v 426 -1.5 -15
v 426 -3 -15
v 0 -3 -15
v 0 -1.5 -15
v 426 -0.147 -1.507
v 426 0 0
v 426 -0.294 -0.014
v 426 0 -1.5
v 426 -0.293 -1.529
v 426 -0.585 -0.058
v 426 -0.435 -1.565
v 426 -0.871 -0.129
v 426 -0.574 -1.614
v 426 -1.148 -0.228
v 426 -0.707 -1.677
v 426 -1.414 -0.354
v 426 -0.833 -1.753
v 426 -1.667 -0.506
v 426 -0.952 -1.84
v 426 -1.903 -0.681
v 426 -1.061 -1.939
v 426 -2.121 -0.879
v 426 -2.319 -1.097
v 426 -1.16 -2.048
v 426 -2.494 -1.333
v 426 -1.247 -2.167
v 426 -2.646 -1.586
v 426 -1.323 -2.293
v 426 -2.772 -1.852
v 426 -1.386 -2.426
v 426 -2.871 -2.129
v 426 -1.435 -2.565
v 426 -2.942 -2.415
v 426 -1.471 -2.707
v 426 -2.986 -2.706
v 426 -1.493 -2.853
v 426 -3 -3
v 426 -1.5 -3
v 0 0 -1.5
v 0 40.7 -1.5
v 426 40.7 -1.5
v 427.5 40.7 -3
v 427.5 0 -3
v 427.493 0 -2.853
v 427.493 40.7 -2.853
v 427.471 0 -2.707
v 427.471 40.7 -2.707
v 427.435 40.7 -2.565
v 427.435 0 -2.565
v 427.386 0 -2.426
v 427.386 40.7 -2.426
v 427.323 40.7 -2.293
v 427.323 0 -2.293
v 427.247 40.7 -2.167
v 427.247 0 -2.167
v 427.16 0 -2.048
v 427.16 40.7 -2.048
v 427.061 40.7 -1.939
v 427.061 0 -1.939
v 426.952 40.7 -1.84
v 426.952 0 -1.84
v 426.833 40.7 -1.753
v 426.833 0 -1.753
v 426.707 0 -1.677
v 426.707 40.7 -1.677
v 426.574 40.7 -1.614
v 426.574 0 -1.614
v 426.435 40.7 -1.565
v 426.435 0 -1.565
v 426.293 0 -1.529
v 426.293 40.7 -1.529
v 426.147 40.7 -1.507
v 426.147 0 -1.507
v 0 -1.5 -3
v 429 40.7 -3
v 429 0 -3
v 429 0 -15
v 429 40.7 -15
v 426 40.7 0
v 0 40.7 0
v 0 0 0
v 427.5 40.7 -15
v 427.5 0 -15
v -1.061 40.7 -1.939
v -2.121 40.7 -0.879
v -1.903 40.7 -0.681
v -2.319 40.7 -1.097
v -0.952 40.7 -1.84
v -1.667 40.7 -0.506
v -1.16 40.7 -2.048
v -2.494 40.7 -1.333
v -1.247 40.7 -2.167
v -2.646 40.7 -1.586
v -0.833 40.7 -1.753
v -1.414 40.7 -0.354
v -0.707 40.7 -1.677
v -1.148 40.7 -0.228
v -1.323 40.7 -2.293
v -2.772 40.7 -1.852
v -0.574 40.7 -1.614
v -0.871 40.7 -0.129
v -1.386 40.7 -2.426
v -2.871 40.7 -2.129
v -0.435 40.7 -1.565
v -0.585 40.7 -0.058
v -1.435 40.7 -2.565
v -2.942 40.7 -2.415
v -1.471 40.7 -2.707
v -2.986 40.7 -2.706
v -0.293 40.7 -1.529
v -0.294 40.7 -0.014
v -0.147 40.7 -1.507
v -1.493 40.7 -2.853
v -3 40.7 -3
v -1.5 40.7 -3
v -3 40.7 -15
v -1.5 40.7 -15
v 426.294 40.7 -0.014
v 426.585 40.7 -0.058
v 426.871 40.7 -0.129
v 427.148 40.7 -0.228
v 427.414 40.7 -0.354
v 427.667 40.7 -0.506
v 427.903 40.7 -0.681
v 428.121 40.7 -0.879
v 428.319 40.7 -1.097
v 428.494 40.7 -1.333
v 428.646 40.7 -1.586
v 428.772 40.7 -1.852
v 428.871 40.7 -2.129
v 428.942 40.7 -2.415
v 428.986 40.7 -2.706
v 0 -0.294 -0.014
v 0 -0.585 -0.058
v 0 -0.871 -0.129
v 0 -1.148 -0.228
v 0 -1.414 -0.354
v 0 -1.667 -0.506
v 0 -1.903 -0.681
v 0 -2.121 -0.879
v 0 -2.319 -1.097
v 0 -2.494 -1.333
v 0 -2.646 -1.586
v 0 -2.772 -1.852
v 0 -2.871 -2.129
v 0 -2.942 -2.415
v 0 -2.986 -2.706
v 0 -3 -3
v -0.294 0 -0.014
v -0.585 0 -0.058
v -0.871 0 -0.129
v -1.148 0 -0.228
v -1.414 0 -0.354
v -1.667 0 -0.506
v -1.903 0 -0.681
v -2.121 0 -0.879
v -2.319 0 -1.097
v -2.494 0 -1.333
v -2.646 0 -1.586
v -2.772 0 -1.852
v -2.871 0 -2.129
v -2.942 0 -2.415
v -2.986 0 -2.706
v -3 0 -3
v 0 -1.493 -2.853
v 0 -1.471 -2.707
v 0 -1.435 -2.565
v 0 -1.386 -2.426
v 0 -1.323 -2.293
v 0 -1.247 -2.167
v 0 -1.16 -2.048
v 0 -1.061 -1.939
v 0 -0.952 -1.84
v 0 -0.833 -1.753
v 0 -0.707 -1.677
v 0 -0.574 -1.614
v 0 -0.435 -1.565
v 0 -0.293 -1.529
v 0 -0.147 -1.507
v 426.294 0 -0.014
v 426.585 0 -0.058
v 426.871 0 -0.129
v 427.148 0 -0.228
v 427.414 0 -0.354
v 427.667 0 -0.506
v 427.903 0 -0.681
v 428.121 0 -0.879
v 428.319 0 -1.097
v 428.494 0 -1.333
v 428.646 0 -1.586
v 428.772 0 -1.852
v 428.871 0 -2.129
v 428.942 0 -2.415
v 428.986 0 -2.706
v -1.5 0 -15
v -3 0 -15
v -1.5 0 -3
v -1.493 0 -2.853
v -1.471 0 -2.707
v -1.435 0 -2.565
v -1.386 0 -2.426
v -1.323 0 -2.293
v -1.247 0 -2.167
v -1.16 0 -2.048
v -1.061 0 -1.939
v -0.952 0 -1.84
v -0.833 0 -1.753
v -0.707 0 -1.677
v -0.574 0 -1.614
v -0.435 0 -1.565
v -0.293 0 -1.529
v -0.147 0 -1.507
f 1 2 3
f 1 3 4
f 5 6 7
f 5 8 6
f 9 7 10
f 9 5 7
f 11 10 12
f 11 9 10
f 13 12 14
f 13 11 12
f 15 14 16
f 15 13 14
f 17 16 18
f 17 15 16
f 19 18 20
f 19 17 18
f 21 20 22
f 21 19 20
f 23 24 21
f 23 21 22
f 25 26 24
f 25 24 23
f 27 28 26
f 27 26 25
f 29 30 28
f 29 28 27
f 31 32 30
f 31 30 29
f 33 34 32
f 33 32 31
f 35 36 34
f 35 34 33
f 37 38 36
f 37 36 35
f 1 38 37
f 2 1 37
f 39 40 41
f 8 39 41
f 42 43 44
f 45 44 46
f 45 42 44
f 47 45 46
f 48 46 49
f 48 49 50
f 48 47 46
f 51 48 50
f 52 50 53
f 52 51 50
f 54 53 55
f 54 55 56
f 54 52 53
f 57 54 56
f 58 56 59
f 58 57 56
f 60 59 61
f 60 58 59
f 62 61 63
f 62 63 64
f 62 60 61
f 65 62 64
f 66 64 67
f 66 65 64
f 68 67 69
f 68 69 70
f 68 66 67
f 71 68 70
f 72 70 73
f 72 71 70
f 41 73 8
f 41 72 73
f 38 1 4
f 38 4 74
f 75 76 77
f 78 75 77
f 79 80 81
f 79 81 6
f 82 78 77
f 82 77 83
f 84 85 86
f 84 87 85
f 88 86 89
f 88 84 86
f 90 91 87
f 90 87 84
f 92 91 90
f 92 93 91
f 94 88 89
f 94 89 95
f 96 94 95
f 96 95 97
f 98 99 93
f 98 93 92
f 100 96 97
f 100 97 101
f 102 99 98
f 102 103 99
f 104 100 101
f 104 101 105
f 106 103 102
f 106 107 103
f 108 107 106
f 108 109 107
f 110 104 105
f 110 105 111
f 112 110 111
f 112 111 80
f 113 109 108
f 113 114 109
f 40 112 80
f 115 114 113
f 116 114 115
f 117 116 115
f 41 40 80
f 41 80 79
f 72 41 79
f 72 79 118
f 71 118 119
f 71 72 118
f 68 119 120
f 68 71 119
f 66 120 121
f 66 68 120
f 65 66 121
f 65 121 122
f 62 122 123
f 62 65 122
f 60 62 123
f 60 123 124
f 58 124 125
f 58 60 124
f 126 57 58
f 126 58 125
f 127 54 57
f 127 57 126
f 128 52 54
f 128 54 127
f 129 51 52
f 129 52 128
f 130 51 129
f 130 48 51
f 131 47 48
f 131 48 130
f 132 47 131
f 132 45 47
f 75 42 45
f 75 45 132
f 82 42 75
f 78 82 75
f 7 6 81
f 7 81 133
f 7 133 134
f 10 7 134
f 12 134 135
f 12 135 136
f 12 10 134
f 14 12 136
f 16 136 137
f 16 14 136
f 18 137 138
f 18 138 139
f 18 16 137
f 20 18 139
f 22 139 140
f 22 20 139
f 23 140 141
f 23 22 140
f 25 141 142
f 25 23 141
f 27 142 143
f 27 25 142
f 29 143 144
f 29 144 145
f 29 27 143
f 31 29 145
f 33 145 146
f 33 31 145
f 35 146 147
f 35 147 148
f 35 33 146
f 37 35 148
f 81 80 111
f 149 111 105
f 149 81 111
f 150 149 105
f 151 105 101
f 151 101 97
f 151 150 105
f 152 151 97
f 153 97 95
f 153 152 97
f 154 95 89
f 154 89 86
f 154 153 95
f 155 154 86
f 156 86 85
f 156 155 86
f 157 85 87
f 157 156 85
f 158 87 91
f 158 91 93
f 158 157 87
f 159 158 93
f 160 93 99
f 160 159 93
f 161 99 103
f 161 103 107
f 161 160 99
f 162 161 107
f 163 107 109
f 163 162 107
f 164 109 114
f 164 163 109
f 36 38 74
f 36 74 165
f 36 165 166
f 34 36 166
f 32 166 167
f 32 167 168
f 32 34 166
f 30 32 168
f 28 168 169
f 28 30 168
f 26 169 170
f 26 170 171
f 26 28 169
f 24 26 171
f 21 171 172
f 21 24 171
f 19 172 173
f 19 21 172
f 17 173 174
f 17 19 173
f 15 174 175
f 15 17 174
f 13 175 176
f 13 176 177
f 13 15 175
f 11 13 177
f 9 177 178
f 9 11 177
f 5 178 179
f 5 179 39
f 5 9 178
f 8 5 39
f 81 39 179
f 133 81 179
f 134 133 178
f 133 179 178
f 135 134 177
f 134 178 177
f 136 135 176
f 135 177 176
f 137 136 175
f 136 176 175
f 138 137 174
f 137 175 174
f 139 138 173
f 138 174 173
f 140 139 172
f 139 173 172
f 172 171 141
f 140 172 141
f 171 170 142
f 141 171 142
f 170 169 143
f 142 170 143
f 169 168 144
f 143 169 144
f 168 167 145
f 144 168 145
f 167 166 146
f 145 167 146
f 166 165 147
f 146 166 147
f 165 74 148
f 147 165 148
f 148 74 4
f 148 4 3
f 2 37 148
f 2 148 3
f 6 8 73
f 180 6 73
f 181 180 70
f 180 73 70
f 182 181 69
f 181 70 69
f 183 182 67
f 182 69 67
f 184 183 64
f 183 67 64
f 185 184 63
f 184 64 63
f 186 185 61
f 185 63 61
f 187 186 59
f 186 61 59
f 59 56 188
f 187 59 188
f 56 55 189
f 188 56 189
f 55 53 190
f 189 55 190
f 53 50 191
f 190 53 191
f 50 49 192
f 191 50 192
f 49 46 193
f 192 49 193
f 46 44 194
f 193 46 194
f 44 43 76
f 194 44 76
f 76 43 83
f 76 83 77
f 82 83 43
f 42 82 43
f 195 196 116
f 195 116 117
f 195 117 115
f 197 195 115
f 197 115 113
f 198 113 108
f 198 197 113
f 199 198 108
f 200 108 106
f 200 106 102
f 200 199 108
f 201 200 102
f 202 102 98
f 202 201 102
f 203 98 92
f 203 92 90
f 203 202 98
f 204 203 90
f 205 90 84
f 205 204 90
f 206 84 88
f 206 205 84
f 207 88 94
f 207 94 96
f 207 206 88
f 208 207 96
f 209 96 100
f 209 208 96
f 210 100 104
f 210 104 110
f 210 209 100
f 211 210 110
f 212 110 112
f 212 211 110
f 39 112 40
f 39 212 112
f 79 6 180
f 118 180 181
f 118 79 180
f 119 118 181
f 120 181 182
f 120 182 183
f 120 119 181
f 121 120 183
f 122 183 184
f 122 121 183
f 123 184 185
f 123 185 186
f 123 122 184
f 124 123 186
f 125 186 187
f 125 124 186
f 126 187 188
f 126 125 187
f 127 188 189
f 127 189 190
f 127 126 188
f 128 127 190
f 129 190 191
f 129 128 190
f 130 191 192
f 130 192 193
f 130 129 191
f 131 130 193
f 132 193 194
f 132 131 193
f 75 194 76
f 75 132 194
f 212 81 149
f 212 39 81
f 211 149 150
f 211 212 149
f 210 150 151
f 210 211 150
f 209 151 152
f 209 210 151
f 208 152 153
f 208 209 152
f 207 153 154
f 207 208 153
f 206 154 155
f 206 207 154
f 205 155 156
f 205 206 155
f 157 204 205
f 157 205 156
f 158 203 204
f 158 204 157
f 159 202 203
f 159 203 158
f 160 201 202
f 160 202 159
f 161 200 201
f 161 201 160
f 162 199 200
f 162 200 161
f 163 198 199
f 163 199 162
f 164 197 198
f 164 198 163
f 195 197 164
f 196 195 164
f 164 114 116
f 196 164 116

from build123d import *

# Parameters (mm, degrees)
SKETCH_1_W             = 426
SKETCH_1_H             = 40.7
SM_BASE_FLANGE_1_DEPTH = 1.5
SM_EDGE_FLANGE_2_DEPTH = 40.7
SM_EDGE_FLANGE_3_DEPTH = 426
SM_EDGE_FLANGE_4_DEPTH = 40.7


# Sheet-metal steps are written as plain solids
with BuildPart() as part:
    # Sketch 1 → Базовая кромка1 (new body)
    with BuildSketch(Plane.XY):
        with Locations((213, 20.35)):
            Rectangle(SKETCH_1_W, SKETCH_1_H)
    extrude(amount=-SM_BASE_FLANGE_1_DEPTH)

    # Ребро-кромка2 section (across the edge) → Ребро-кромка2 (add)
    with BuildSketch(Plane(origin=(-1.5, 0, -1.5), x_dir=(1, 0, 0), z_dir=(0, 1, 0))):
        with BuildLine():
            Line((-1.5, 1.5), (-1.5, 13.5))
            Line((-1.5, 13.5), (0, 13.5))
            Line((0, 13.5), (0, 1.5))
            ThreePointArc((0, 1.5), (0.439339828, 0.439339828), (1.5, 0))
            Line((1.5, 0), (1.5, -1.5))
            ThreePointArc((1.5, -1.5), (-0.621320344, -0.621320344), (-1.5, 1.5))
        make_face()
    extrude(amount=SM_EDGE_FLANGE_2_DEPTH)

    # Ребро-кромка3 section (across the edge) → Ребро-кромка3 (add)
    with BuildSketch(Plane(origin=(426, -1.5, -1.5), x_dir=(0, 1, 0), z_dir=(-1, 0, 0))):
        with BuildLine():
            Line((-1.5, 1.5), (-1.5, 13.5))
            Line((-1.5, 13.5), (0, 13.5))
            Line((0, 13.5), (0, 1.5))
            ThreePointArc((0, 1.5), (0.439339828, 0.439339828), (1.5, 0))
            Line((1.5, 0), (1.5, -1.5))
            ThreePointArc((1.5, -1.5), (-0.621320344, -0.621320344), (-1.5, 1.5))
        make_face()
    extrude(amount=SM_EDGE_FLANGE_3_DEPTH)

    # Ребро-кромка4 section (across the edge) → Ребро-кромка4 (add)
    with BuildSketch(Plane(origin=(427.5, 40.7, -1.5), x_dir=(-1, 0, 0), z_dir=(0, -1, 0))):
        with BuildLine():
            Line((-1.5, 1.5), (-1.5, 13.5))
            Line((-1.5, 13.5), (0, 13.5))
            Line((0, 13.5), (0, 1.5))
            ThreePointArc((0, 1.5), (0.439339828, 0.439339828), (1.5, 0))
            Line((1.5, 0), (1.5, -1.5))
            ThreePointArc((1.5, -1.5), (-0.621320344, -0.621320344), (-1.5, 1.5))
        make_face()
    extrude(amount=SM_EDGE_FLANGE_4_DEPTH)


solid = part.part
